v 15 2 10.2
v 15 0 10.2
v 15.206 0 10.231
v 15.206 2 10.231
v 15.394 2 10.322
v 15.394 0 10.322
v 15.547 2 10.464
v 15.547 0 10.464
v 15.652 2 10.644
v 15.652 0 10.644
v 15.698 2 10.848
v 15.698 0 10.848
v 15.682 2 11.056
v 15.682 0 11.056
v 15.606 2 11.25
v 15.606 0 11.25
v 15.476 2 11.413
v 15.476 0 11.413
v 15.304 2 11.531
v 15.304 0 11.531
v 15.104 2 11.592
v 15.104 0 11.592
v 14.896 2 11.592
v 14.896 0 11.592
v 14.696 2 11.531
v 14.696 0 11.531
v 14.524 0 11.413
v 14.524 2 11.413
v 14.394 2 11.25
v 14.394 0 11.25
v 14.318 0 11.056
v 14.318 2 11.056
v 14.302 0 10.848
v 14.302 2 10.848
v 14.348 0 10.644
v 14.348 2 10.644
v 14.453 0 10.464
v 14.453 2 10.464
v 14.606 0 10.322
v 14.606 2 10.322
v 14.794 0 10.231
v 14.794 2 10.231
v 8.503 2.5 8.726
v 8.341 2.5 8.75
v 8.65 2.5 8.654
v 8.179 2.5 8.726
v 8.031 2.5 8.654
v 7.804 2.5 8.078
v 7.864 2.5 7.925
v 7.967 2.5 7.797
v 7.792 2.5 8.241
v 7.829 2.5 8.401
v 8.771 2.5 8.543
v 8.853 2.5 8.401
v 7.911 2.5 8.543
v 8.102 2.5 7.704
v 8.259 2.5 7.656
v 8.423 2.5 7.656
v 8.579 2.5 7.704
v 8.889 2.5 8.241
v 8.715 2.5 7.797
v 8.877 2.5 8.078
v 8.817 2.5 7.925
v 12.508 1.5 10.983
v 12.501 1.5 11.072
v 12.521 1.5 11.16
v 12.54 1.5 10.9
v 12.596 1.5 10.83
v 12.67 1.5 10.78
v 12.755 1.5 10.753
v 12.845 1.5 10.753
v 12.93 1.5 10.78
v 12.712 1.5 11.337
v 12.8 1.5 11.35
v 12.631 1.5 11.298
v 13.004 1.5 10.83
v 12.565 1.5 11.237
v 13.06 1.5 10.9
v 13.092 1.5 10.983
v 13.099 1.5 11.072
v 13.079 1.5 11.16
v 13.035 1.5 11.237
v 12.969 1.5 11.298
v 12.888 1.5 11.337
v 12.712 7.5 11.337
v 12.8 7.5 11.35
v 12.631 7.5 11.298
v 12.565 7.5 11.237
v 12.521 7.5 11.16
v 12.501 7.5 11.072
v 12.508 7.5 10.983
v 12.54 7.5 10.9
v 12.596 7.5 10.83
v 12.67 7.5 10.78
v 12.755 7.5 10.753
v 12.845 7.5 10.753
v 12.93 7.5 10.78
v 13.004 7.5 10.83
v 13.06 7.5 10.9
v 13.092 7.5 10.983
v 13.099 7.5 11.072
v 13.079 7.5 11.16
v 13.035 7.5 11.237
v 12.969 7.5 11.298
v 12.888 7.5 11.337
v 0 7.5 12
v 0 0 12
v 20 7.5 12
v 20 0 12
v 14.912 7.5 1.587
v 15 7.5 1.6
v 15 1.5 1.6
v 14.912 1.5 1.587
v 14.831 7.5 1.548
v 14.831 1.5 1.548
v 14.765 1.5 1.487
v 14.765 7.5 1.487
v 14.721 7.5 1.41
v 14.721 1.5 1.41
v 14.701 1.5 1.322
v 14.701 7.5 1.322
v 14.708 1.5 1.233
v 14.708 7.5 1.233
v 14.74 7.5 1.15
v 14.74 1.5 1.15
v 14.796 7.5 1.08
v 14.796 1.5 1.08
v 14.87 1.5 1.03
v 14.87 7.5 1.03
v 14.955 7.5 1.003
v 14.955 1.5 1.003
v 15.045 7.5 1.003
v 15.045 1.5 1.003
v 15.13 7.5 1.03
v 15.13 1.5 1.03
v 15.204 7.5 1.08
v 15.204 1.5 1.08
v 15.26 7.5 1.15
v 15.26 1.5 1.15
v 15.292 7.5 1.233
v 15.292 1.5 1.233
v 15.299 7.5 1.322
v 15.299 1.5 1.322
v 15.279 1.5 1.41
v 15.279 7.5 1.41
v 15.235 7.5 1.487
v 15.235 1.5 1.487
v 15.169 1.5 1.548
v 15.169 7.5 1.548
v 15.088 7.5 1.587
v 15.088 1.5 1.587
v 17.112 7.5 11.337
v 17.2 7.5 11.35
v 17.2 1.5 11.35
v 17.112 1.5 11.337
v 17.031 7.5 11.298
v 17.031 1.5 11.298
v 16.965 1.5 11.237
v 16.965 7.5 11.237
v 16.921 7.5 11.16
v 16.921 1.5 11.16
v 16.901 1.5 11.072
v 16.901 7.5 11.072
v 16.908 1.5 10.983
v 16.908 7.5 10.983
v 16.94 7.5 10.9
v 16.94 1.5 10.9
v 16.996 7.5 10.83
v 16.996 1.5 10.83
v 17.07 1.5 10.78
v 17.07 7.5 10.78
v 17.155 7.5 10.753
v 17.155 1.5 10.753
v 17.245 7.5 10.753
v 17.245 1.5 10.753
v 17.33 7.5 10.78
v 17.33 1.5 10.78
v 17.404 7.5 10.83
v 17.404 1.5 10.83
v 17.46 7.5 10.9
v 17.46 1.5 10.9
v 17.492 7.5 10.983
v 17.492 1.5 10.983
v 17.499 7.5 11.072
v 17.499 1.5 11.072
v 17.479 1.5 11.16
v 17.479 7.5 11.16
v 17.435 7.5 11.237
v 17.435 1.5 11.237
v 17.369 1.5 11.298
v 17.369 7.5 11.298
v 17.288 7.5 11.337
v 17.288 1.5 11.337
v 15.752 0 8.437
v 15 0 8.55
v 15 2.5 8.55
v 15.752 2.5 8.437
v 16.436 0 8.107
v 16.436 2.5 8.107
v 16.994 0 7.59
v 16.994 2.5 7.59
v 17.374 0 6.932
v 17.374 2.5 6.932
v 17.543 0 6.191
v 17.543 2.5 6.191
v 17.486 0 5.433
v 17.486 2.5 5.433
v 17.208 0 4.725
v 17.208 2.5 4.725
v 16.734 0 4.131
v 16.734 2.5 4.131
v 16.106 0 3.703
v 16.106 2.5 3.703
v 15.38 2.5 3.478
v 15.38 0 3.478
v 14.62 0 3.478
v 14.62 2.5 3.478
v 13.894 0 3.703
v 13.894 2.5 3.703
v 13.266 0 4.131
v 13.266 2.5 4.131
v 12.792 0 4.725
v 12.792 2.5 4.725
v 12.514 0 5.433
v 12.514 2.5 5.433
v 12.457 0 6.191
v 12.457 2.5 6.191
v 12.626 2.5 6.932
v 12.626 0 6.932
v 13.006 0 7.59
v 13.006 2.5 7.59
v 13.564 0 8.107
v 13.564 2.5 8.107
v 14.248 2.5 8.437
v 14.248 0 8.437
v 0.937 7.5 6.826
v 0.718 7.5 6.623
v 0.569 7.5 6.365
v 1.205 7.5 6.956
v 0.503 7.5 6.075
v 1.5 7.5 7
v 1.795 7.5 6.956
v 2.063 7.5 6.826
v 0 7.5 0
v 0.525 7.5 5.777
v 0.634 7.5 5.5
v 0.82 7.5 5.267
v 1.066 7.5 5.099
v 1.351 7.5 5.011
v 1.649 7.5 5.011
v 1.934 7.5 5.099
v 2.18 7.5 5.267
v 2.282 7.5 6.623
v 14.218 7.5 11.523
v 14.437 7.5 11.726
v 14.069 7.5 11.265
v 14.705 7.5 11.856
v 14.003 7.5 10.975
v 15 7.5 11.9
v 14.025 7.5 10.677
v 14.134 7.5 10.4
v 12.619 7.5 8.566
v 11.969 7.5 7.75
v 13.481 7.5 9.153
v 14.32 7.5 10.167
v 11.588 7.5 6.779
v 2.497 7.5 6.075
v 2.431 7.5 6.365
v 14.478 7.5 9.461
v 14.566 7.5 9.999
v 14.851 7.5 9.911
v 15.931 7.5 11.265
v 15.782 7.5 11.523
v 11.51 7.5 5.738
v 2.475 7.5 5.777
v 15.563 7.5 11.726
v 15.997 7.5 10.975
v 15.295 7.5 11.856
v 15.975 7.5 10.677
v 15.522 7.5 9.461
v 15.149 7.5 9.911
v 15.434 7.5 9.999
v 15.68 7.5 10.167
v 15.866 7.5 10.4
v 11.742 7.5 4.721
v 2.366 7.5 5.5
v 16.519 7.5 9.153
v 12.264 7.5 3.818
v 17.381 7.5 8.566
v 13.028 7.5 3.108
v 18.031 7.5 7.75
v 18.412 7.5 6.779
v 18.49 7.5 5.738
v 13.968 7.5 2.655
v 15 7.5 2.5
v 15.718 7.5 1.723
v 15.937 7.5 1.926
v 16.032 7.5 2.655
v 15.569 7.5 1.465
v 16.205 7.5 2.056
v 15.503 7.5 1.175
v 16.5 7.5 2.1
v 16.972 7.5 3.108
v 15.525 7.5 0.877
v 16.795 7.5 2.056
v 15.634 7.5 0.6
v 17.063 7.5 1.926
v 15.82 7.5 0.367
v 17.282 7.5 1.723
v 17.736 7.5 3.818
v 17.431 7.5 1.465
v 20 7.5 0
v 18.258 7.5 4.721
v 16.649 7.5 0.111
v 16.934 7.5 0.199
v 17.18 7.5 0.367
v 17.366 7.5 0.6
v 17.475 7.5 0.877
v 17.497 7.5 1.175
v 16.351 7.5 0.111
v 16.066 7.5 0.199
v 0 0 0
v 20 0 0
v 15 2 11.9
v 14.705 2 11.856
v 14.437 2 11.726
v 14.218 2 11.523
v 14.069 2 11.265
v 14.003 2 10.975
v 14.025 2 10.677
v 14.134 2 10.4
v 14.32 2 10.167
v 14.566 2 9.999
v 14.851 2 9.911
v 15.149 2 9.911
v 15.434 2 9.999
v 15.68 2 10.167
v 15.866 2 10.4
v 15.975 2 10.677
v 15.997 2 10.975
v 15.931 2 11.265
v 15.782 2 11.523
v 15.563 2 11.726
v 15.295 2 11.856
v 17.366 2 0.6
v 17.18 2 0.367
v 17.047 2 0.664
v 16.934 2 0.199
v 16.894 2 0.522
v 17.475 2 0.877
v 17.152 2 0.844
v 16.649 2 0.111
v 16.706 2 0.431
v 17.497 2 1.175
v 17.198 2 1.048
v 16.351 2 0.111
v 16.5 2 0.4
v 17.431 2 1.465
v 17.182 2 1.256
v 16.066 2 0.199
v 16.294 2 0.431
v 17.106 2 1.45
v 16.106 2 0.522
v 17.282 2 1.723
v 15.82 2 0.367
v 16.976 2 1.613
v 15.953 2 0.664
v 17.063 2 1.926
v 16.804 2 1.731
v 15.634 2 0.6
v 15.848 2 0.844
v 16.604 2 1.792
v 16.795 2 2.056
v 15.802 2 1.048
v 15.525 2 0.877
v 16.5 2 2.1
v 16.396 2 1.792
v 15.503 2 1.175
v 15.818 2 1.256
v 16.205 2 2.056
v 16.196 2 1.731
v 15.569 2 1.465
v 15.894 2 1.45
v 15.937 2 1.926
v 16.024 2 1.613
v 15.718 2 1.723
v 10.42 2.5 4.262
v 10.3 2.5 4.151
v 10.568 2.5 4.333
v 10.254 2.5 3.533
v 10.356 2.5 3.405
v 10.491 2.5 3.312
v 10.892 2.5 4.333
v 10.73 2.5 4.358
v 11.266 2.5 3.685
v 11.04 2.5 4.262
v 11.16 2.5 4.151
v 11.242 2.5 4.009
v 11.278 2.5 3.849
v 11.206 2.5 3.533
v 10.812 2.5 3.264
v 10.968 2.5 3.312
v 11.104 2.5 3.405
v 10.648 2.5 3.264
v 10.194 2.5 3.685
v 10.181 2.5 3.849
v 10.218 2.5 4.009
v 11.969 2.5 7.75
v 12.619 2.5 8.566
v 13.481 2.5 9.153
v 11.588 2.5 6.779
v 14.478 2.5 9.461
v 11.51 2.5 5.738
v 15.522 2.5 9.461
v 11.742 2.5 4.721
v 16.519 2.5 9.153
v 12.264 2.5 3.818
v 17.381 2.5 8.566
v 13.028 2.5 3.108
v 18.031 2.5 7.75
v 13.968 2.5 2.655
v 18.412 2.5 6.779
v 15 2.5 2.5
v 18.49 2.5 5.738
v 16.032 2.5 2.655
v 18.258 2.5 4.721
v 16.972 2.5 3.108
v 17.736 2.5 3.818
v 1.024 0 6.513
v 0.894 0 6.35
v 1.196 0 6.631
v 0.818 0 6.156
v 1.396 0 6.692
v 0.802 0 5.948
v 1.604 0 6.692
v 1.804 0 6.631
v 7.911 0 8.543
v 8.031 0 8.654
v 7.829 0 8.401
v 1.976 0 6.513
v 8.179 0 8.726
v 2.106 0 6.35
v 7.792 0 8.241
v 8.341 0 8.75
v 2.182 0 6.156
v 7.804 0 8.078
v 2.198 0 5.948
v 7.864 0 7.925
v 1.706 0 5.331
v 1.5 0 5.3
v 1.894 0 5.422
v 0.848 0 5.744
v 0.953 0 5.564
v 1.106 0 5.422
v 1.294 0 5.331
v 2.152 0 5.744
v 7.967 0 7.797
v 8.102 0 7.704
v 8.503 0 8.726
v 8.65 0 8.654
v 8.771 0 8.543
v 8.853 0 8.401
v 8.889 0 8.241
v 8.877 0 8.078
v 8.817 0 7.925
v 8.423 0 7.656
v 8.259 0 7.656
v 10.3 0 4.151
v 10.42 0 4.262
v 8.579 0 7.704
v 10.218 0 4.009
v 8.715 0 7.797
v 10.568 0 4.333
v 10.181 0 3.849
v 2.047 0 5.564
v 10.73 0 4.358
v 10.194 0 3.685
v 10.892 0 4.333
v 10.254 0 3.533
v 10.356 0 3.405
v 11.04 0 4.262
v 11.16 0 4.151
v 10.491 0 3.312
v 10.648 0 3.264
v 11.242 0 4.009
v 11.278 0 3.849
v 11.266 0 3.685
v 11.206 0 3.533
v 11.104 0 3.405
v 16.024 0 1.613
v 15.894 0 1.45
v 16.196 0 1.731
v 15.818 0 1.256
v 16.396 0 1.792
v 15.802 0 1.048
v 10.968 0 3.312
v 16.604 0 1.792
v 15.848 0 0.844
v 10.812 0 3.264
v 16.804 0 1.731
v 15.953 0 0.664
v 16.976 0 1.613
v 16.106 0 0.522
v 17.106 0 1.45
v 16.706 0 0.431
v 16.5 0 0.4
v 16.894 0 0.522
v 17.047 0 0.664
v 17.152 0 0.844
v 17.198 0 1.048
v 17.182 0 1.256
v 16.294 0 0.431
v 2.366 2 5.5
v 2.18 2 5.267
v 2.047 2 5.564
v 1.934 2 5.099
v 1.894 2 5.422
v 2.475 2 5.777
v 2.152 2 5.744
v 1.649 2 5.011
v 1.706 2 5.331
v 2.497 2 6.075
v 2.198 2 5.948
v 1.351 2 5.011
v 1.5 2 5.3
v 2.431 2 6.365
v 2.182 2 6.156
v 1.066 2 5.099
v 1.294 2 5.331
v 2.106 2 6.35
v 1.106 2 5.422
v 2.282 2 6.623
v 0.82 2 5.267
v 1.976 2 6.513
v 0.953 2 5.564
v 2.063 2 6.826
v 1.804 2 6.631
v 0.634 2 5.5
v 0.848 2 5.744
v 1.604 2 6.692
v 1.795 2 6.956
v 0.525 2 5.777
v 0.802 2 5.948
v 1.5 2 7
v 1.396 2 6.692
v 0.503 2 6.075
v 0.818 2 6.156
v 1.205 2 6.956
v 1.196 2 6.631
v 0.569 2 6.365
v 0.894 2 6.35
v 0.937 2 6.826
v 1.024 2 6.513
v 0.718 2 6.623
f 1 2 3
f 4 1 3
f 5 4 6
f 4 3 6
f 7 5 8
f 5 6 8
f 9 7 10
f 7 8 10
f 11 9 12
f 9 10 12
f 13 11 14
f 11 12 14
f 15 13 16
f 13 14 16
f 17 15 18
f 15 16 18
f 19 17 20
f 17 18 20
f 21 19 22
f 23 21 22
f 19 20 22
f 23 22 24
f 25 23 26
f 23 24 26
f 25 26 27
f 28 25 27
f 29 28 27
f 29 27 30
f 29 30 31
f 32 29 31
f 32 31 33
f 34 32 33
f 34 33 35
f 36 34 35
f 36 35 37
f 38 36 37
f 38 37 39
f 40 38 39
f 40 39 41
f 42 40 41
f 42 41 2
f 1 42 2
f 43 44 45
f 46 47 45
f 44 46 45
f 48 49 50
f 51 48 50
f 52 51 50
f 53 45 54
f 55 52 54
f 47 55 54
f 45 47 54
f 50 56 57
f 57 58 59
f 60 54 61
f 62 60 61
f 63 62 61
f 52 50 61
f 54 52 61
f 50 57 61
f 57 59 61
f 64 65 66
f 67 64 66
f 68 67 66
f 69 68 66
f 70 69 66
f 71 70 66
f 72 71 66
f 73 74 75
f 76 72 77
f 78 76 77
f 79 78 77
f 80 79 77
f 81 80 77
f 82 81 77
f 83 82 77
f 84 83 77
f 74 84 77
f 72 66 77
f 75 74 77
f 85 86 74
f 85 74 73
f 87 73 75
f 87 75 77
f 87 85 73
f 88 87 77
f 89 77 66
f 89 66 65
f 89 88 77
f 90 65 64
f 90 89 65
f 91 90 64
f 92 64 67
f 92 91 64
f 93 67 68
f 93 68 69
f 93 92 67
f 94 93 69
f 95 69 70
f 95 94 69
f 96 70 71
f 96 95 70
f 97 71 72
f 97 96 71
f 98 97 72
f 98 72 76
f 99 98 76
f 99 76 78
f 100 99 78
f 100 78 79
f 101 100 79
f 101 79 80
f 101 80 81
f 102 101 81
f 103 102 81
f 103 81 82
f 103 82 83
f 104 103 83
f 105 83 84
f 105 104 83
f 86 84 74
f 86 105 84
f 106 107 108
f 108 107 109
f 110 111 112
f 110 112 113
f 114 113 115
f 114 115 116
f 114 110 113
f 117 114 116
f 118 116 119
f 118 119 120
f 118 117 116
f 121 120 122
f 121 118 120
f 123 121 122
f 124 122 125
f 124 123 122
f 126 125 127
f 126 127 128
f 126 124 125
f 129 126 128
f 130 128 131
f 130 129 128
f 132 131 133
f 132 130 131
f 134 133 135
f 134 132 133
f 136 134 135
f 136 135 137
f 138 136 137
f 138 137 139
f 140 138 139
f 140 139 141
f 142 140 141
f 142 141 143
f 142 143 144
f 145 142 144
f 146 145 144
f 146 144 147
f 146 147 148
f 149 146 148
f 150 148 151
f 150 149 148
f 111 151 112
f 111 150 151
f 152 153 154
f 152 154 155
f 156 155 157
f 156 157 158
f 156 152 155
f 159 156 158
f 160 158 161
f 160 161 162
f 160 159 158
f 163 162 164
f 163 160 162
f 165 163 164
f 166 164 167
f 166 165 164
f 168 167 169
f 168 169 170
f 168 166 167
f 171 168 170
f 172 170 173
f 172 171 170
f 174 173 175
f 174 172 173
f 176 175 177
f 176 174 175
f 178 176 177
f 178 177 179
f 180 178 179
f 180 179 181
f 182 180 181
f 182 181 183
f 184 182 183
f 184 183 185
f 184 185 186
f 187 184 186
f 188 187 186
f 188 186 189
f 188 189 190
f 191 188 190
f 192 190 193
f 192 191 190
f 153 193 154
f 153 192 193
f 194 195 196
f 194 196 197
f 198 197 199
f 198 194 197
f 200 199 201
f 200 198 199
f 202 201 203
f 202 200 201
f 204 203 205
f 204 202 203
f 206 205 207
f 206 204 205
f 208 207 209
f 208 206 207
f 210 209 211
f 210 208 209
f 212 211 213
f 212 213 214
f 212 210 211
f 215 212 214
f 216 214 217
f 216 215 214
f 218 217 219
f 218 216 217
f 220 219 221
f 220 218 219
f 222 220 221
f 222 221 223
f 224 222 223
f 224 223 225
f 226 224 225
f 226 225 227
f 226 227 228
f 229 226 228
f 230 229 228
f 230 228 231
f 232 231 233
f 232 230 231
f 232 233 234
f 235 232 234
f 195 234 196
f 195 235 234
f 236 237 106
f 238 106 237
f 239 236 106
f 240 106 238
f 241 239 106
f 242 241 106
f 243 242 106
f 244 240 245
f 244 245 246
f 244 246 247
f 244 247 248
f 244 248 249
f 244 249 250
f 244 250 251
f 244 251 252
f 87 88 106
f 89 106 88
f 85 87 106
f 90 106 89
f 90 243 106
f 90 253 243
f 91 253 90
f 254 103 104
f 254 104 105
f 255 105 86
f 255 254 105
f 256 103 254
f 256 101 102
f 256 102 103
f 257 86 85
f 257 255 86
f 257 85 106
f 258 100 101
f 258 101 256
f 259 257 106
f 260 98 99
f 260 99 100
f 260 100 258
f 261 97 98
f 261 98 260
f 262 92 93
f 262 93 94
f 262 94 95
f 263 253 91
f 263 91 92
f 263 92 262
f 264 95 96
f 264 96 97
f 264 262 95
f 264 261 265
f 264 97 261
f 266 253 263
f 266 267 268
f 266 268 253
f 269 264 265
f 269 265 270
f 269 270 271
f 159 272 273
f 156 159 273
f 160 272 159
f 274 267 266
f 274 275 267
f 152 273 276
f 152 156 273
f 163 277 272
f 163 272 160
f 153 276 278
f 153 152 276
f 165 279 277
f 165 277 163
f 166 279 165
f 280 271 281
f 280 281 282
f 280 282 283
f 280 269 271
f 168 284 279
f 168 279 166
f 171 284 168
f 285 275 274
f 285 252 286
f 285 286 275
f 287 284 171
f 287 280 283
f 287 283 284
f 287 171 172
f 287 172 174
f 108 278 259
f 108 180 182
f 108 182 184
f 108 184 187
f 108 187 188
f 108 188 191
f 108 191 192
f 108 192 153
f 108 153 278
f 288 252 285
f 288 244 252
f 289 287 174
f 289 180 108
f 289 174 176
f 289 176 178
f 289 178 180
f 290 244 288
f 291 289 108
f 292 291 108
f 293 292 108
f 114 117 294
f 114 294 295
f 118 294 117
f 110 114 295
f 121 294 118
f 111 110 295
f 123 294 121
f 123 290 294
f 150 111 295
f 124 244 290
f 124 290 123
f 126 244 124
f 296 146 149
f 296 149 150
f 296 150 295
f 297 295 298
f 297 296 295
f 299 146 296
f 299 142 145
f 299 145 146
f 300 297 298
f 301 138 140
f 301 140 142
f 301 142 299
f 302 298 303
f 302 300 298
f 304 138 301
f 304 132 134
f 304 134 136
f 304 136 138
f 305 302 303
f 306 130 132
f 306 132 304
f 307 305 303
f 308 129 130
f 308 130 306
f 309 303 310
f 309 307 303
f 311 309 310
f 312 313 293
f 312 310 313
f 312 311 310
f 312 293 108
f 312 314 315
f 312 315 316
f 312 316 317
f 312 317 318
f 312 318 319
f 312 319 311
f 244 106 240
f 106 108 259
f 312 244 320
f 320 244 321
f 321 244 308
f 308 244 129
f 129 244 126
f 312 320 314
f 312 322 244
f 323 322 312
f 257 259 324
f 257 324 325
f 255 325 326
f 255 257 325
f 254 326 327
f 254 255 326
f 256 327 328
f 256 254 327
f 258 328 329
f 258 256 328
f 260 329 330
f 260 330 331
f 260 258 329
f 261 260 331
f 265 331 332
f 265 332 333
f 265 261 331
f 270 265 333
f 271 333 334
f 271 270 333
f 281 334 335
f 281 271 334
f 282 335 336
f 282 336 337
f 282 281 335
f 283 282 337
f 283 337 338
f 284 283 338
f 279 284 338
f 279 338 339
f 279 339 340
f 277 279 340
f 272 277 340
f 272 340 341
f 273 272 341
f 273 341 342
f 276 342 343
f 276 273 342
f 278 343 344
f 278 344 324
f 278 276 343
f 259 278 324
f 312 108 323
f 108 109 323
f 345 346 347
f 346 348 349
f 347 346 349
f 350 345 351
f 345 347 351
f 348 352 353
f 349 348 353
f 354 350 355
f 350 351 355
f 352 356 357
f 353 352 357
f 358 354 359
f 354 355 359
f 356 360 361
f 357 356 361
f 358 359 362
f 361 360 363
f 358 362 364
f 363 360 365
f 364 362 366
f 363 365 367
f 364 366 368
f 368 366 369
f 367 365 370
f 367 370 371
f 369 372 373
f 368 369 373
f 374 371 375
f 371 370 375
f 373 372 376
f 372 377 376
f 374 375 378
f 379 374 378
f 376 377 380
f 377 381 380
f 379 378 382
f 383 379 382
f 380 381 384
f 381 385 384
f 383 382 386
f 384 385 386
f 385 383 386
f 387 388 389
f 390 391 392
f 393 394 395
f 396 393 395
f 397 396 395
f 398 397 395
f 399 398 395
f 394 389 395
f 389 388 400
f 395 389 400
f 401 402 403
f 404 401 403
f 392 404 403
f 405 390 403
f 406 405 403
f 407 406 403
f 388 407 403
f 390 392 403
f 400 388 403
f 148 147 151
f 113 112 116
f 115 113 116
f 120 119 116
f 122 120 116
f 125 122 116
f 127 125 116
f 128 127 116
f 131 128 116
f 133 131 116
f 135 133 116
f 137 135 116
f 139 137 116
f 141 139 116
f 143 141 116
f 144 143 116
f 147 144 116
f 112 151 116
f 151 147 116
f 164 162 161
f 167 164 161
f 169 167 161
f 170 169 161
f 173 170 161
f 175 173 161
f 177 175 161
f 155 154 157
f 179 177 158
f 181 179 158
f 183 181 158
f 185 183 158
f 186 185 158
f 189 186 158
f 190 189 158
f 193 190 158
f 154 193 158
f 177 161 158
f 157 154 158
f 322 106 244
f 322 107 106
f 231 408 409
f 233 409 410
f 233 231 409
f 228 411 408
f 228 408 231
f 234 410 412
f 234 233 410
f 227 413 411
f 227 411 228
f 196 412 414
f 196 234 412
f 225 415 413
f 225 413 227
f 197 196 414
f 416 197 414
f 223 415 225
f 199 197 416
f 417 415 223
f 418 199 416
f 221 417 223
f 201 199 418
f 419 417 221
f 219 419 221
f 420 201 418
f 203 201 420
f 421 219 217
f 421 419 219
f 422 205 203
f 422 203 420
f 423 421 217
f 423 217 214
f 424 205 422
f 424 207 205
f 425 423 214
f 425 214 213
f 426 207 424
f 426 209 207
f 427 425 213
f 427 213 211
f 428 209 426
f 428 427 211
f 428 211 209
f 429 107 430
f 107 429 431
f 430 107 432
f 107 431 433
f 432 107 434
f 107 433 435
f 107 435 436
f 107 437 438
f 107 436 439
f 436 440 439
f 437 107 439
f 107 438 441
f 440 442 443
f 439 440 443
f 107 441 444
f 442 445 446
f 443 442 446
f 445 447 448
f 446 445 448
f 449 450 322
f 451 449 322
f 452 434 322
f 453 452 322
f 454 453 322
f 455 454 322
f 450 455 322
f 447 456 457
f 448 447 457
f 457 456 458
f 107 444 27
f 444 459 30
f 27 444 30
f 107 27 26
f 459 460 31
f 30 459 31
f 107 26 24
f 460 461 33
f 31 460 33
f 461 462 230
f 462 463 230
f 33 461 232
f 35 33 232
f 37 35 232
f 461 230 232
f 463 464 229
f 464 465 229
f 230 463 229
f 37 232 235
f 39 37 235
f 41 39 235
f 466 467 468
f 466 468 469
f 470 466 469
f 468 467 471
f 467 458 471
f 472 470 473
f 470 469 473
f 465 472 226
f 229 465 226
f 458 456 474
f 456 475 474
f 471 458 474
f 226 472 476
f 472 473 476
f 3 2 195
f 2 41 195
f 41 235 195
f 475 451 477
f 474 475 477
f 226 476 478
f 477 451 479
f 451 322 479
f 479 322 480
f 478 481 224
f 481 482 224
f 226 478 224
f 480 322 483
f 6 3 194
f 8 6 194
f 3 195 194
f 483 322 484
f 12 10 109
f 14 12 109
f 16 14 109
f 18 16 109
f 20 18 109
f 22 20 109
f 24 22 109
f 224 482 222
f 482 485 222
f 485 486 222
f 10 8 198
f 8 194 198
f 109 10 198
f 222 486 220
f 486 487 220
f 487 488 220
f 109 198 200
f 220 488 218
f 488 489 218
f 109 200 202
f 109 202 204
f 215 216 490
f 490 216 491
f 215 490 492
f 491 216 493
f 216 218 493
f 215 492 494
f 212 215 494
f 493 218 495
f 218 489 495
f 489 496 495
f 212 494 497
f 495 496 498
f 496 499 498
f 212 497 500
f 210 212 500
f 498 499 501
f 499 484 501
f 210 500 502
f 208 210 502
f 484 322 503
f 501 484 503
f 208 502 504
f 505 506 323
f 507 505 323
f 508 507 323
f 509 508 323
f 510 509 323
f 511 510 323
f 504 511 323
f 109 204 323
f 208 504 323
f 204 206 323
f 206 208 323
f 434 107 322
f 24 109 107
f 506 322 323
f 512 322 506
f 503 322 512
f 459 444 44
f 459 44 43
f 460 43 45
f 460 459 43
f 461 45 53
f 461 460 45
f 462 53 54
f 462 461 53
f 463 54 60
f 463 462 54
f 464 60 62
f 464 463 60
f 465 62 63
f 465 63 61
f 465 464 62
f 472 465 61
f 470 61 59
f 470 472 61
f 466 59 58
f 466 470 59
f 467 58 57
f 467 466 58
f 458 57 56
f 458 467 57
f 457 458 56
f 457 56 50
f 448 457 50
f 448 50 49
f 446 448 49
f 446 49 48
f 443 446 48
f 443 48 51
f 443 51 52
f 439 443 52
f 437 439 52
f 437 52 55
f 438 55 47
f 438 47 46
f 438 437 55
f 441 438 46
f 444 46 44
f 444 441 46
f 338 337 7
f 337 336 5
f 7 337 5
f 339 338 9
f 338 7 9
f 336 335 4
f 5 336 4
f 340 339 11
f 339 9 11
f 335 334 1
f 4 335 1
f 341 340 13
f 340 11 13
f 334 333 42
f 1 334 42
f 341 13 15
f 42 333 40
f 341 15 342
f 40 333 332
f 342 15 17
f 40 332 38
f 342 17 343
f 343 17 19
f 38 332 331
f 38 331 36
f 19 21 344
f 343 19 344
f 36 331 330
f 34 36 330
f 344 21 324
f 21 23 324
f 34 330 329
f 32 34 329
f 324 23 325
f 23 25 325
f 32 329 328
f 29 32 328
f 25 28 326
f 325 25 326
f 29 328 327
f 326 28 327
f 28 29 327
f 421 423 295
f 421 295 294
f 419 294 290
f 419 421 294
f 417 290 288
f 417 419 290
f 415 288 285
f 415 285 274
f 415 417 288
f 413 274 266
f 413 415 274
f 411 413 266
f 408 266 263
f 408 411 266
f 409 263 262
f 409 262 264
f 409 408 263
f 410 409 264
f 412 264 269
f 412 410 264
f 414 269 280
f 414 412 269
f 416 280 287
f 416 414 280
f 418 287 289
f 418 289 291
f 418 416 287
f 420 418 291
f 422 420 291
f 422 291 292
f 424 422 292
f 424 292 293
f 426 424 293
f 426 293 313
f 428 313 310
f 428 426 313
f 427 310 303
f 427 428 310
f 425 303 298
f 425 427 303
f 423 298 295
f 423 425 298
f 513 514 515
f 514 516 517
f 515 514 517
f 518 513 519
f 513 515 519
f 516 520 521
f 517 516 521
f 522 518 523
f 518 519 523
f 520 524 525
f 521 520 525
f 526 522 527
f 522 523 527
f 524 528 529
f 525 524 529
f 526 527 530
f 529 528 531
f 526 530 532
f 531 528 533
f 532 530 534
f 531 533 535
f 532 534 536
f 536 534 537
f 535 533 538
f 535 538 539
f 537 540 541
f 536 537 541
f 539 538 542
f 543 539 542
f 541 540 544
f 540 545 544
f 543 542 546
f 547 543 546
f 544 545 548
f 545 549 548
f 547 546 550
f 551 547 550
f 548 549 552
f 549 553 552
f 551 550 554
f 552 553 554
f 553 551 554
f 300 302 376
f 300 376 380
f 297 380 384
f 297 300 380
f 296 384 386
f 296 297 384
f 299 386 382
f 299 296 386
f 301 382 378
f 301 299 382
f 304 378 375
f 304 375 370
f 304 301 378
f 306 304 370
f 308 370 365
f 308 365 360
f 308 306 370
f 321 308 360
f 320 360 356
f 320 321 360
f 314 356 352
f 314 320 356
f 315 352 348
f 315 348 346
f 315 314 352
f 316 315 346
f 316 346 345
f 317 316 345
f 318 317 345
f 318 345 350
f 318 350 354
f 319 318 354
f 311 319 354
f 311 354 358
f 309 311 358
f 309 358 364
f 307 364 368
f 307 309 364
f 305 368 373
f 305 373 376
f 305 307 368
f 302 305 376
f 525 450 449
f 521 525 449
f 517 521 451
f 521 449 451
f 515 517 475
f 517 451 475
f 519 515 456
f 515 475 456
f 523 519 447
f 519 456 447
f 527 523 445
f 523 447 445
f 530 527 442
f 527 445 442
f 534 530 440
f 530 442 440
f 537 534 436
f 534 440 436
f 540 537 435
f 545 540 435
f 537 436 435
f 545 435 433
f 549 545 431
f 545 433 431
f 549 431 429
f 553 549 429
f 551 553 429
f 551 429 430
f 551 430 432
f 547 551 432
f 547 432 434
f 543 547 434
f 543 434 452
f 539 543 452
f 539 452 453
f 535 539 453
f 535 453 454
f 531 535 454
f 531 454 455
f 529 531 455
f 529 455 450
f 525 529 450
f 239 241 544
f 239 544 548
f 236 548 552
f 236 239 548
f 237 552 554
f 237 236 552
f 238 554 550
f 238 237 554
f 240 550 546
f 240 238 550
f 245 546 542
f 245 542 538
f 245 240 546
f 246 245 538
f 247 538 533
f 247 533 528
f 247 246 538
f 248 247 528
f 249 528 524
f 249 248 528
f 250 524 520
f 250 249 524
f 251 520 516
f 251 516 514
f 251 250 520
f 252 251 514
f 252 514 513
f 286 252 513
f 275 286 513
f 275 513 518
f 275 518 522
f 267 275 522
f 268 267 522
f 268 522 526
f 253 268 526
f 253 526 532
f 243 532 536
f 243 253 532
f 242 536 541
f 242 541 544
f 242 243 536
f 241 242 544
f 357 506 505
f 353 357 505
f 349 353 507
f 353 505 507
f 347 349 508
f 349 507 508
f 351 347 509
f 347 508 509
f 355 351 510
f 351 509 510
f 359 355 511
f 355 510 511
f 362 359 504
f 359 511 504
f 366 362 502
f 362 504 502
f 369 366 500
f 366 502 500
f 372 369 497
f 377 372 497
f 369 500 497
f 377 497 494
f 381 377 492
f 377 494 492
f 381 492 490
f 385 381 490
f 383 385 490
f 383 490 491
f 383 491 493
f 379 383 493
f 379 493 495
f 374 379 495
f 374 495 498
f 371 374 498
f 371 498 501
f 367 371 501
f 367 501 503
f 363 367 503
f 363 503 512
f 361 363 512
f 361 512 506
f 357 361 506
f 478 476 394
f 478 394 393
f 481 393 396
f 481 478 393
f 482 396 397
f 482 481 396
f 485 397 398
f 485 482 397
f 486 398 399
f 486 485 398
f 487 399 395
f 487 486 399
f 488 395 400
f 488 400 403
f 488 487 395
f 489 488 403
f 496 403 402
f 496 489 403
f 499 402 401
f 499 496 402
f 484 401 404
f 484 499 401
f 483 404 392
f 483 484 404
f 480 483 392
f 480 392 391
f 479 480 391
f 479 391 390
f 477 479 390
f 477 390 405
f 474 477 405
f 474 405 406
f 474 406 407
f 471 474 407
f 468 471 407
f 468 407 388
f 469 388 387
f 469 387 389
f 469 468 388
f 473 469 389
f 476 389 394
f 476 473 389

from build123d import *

# Parameters (mm, degrees)
SKETCH_1_W          = 20
SKETCH_1_H          = 12
EXTRUDE_1_DEPTH     = 2.5
SKETCH_1_9_R        = 0.55
SKETCH_1_9_R_2      = 2.55
CUT_EXTRUDE_3_DEPTH = 2.5
EXTRUDE_START       = 2.5
SKETCH_1_10_W       = 20
SKETCH_1_10_H       = 12
SKETCH_1_10_R       = 3.5
EXTRUDE_2_DEPTH     = 5
SKETCH_2_R          = 0.7
CUT_EXTRUDE_4_DEPTH = 25.5
CUT_EXTRUDE_START   = -7.5
SKETCH_2_3_R        = 1
CUT_EXTRUDE_5_DEPTH = 5.5
SKETCH_2_6_R        = 0.3
CUT_EXTRUDE_6_DEPTH = 6


with BuildPart() as part:
    # 草图1 → 凸台-拉伸1 (new body)
    with BuildSketch(Plane(origin=(0, 0, 0), x_dir=(1, 0, 0), z_dir=(0, 1, 0))):
        with Locations((10, -6)):
            Rectangle(SKETCH_1_W, SKETCH_1_H)
    extrude(amount=EXTRUDE_1_DEPTH)

    # 草图1<9> → 切除-拉伸3 (cut)
    with BuildSketch(Plane(origin=(0, 0, 0), x_dir=(1, 0, 0), z_dir=(0, 1, 0))):
        with Locations(Location((8.340658618, -8.2, 0), (0, 0, 270))):
            Circle(SKETCH_1_9_R)
        with Locations(Location((10.72985855, -3.807765525, 0), (0, 0, 270))):
            Circle(SKETCH_1_9_R)
        with Locations(Location((15, -6, 0), (0, 0, 270))):
            Circle(SKETCH_1_9_R_2)
    extrude(amount=CUT_EXTRUDE_3_DEPTH, mode=Mode.SUBTRACT)

    # 草图1<10> → 凸台-拉伸2 (add)
    with BuildSketch(Plane(origin=(0, 0, 0), x_dir=(1, 0, 0), z_dir=(0, 1, 0)).offset(EXTRUDE_START)):
        with Locations((10, -6)):
            Rectangle(SKETCH_1_10_W, SKETCH_1_10_H)
        with Locations(Location((15, -6, 0), (0, 0, 90))):
            Circle(SKETCH_1_10_R, mode=Mode.SUBTRACT)
    extrude(amount=EXTRUDE_2_DEPTH)

    # 草图2 → 切除-拉伸4 (cut, through all)
    with BuildSketch(Plane.XZ):
        with Locations(Location((15, 10.9, 0), (0, 0, 270))):
            Circle(SKETCH_2_R)
        with Locations(Location((1.5, 6, 0), (0, 0, 270))):
            Circle(SKETCH_2_R)
        with Locations(Location((16.5, 1.1, 0), (0, 0, 270))):
            Circle(SKETCH_2_R)
    extrude(amount=-CUT_EXTRUDE_4_DEPTH, mode=Mode.SUBTRACT)

    # 草图2<3> → 切除-拉伸5 (cut)
    with BuildSketch(Plane.XZ.offset(CUT_EXTRUDE_START)):
        with Locations(Location((16.5, 1.1, 0), (0, 0, 90))):
            Circle(SKETCH_2_3_R)
        with Locations(Location((15, 10.9, 0), (0, 0, 90))):
            Circle(SKETCH_2_3_R)
        with Locations(Location((1.5, 6, 0), (0, 0, 90))):
            Circle(SKETCH_2_3_R)
    extrude(amount=CUT_EXTRUDE_5_DEPTH, mode=Mode.SUBTRACT)

    # 草图2<6> → 切除-拉伸6 (cut)
    with BuildSketch(Plane.XZ.offset(CUT_EXTRUDE_START)):
        with Locations(Location((12.8, 11.05, 0), (0, 0, 90))):
            Circle(SKETCH_2_6_R)
        with Locations(Location((17.2, 11.05, 0), (0, 0, 90))):
            Circle(SKETCH_2_6_R)
        with Locations(Location((15, 1.3, 0), (0, 0, 90))):
            Circle(SKETCH_2_6_R)
    extrude(amount=CUT_EXTRUDE_6_DEPTH, mode=Mode.SUBTRACT)


solid = part.part
